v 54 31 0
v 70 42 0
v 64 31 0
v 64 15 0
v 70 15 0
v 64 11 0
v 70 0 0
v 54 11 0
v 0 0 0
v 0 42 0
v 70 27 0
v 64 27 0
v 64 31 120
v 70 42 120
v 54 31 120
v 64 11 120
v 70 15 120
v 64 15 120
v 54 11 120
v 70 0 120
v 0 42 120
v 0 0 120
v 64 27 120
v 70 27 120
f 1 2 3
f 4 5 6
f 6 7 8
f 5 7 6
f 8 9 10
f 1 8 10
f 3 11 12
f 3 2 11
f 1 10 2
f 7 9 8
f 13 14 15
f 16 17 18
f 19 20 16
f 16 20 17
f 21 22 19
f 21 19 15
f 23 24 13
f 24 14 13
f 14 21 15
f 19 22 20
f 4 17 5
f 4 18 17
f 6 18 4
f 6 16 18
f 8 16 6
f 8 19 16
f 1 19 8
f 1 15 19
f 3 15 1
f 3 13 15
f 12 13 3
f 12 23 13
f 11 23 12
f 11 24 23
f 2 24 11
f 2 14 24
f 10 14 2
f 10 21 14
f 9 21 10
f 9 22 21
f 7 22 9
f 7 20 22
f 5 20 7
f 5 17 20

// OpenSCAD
$fn = 32;

// ----------------------------------------------------------------------
// T-slot rail: 70 x 42 mm section, 120 mm long
// ----------------------------------------------------------------------

// --- parameters (mm) ---
profile_height = 120;     // extrusion height
profile_points = 12;      // points of the closed outline

profile = [[0, 0], [70, 0], [70, 15], [64, 15], [64, 11], [54, 11], [54, 31], [64, 31], [64, 27], [70, 27], [70, 42], [0, 42]];  // single closed polygon, 12 points, counter clockwise

// --- the one profile operation ---
linear_extrude(height = profile_height) polygon(points = profile);
